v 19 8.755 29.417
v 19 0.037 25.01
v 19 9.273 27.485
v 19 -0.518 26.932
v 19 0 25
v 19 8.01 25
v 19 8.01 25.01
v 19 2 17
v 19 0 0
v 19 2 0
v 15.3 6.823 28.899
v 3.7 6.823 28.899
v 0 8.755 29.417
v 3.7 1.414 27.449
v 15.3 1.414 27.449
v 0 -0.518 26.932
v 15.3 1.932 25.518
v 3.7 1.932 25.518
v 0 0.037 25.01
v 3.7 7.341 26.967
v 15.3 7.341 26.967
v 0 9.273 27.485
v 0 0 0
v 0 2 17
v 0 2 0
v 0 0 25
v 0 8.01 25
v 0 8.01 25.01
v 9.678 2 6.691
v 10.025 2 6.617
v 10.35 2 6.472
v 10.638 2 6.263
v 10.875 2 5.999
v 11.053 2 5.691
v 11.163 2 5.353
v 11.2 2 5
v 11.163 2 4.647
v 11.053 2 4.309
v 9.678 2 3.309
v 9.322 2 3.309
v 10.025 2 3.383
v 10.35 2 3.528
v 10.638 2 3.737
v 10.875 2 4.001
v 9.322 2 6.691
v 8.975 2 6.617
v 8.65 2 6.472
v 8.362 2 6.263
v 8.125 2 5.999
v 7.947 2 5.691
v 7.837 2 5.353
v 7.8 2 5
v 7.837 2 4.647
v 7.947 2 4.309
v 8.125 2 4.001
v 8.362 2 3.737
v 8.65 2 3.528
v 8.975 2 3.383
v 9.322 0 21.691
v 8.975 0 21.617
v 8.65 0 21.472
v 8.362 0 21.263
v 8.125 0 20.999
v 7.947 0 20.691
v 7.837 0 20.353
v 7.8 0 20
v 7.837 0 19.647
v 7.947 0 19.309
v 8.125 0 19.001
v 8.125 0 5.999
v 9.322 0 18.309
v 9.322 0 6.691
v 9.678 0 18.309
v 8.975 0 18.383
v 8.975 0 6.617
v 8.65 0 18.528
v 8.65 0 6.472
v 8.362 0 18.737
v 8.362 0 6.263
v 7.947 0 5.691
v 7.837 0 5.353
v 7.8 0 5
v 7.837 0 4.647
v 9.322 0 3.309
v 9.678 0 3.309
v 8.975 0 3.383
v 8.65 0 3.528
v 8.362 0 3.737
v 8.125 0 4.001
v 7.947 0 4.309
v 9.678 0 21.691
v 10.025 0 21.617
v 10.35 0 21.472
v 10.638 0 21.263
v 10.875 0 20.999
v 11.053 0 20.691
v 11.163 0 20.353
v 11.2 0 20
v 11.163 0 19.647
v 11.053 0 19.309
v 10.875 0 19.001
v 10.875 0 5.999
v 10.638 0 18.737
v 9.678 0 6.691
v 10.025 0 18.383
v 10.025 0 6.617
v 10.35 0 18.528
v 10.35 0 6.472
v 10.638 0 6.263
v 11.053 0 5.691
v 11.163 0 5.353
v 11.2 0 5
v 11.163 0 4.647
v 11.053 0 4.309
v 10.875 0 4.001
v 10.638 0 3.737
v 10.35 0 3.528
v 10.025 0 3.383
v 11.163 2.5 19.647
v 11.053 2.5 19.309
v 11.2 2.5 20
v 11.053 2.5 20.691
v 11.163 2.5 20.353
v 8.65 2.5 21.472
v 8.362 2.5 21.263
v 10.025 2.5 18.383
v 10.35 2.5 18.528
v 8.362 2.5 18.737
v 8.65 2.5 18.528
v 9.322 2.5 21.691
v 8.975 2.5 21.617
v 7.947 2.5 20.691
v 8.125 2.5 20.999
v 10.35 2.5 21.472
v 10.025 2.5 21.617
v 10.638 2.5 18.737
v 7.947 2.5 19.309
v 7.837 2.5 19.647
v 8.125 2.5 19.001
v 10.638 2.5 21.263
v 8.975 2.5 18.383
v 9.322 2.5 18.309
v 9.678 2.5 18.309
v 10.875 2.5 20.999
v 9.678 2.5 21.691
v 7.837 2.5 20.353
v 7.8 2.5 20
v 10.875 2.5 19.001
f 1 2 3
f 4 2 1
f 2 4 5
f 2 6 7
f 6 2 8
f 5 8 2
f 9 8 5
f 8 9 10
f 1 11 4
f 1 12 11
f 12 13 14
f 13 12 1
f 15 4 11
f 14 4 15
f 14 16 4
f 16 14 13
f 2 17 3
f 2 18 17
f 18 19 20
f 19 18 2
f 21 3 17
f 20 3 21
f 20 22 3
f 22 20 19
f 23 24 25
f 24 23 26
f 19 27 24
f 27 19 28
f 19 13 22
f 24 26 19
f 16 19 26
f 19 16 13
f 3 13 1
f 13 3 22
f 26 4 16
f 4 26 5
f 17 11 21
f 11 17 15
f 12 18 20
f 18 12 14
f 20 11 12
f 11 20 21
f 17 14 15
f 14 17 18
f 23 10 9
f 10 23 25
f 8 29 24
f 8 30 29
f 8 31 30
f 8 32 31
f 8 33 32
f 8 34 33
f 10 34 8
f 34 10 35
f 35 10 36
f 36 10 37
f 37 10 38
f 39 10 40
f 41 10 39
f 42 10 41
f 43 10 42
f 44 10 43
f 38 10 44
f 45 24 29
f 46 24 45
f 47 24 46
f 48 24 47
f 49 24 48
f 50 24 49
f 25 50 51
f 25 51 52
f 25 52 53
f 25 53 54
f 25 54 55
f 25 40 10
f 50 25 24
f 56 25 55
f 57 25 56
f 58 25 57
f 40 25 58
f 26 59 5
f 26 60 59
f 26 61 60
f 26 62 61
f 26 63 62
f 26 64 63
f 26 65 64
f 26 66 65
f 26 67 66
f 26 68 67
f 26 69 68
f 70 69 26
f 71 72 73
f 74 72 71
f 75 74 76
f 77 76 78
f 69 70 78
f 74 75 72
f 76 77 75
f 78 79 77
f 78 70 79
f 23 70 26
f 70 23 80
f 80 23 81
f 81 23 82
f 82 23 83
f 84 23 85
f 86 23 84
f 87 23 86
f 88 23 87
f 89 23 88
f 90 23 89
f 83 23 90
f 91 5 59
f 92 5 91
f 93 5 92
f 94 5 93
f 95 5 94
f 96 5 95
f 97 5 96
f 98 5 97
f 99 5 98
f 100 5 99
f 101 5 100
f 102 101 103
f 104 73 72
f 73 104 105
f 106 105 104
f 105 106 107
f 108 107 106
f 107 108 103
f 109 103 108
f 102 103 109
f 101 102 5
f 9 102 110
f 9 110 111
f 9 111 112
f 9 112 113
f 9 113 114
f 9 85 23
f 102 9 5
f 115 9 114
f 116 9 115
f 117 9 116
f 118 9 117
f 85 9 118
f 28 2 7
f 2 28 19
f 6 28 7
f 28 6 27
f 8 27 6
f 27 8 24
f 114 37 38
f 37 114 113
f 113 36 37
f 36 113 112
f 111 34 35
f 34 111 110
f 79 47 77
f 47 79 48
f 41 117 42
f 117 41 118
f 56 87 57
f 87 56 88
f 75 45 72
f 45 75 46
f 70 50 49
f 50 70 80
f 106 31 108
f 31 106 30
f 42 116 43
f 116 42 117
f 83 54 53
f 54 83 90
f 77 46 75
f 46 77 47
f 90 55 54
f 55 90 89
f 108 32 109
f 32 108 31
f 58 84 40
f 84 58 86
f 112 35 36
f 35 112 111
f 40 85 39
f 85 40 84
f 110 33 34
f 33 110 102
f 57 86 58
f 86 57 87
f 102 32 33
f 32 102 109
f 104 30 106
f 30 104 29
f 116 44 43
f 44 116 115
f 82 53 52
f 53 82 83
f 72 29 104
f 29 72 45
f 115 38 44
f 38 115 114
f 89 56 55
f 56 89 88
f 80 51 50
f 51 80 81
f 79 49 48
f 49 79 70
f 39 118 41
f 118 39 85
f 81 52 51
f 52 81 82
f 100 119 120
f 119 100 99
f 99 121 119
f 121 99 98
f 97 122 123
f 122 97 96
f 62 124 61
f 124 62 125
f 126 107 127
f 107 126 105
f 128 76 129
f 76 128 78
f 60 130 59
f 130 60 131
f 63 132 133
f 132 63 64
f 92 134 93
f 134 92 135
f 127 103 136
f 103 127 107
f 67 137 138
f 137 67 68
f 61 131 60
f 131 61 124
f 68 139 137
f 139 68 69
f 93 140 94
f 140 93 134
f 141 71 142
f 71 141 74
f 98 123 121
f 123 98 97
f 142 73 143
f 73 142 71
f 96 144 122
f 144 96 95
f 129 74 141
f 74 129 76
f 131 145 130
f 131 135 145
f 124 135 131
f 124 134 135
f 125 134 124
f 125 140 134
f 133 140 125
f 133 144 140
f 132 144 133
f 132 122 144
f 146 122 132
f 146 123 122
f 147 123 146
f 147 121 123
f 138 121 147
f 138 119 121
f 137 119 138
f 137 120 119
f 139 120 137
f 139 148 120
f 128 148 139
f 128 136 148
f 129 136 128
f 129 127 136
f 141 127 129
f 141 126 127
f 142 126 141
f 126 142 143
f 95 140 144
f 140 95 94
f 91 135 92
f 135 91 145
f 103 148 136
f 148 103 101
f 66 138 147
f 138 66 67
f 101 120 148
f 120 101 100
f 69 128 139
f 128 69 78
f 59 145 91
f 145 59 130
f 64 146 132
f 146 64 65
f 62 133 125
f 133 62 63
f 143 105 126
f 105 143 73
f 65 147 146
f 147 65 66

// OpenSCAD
// FoldIt Robot - HC-SR04 Ultrasonic Sensor Bracket
// Scale: 1:4 (full-size sensor ~45mm x 20mm, at 1:4 ~11mm x 5mm)
// L-bracket that holds sensor facing down toward belt exit/detection zone
// Mounts to belt_frame rear edge or base plate front edge
//
// PRINT GUIDANCE: Print with the vertical arm flat on bed,
// horizontal arm pointing up. No supports needed.

$fn = 30;

// HC-SR04 sensor at 1:4 scale
sensor_width = 11;         // PCB width
sensor_depth = 5;          // PCB depth (front to back)
sensor_thickness = 1.5;    // PCB thickness
transducer_dia = 4;        // transducer cylinder diameter
transducer_spacing = 6.5;  // center-to-center spacing between transducers
transducer_height = 3;     // transducer protrusion from PCB

// Bracket parameters
wall = 2;
bracket_clearance = 0.3;

// Vertical arm (mounts to frame)
vert_arm_width = sensor_width + wall * 2 + 4;  // extra for mounting holes
vert_arm_height = 25;      // tall enough to position sensor above belt
vert_arm_thickness = wall;

// Horizontal arm (holds sensor)
horiz_arm_width = vert_arm_width;
horiz_arm_length = sensor_depth + wall * 2 + bracket_clearance * 2;
horiz_arm_thickness = wall;

// Sensor pocket depth
pocket_depth = sensor_thickness + 0.5;

// Tilt angle (degrees from horizontal, points sensor toward detection zone)
sensor_tilt = 15;

// Hardware
m2_hole = 2.4;             // M2 clearance for sensor PCB
m3_hole = 3.4;             // M3 clearance for frame mounting
mount_hole_spacing = 15;   // vertical spacing of frame mount holes

module sensor_bracket() {
    difference() {
        union() {
            // Vertical mounting arm
            cube([vert_arm_width, vert_arm_thickness, vert_arm_height]);

            // Horizontal sensor arm (angled)
            translate([0, 0, vert_arm_height])
                rotate([sensor_tilt, 0, 0])
                    _sensor_platform();

            // Corner gusset for rigidity
            _corner_gusset();
        }

        // Frame mounting holes (2 holes in vertical arm)
        _frame_mount_holes();
    }
}

module _sensor_platform() {
    difference() {
        // Platform body
        cube([horiz_arm_width, horiz_arm_length, horiz_arm_thickness]);

        // Sensor pocket (recessed area for PCB to sit in)
        translate([(horiz_arm_width - sensor_width) / 2 - bracket_clearance,
                   wall,
                   -0.5])
            cube([sensor_width + bracket_clearance * 2,
                  sensor_depth + bracket_clearance * 2,
                  pocket_depth + 0.5]);

        // Transducer pass-through holes
        sensor_cx = horiz_arm_width / 2;
        sensor_cy = wall + bracket_clearance + sensor_depth / 2;
        for (dx = [-transducer_spacing / 2, transducer_spacing / 2]) {
            translate([sensor_cx + dx, sensor_cy, -0.5])
                cylinder(d=transducer_dia + 0.5, h=horiz_arm_thickness + 1);
        }

        // M2 mounting holes for sensor PCB (2 holes on sides)
        for (dx = [-(sensor_width / 2 - 1), (sensor_width / 2 - 1)]) {
            translate([sensor_cx + dx, sensor_cy, -0.5])
                cylinder(d=m2_hole, h=horiz_arm_thickness + 1);
        }
    }
}

module _corner_gusset() {
    gusset_size = 8;
    translate([0, 0, vert_arm_height - gusset_size])
        hull() {
            cube([vert_arm_width, vert_arm_thickness, 0.01]);
            translate([0, 0, gusset_size])
                cube([vert_arm_width, 0.01, 0.01]);
            translate([0, gusset_size, gusset_size])
                cube([vert_arm_width, 0.01, 0.01]);
        }
}

module _frame_mount_holes() {
    cx = vert_arm_width / 2;
    z_start = (vert_arm_height - mount_hole_spacing) / 2;

    for (z_off = [0, mount_hole_spacing]) {
        translate([cx, -0.5, z_start + z_off])
            rotate([-90, 0, 0])
                cylinder(d=m3_hole, h=vert_arm_thickness + 1);
    }
}

// Render when opened directly
sensor_bracket();
